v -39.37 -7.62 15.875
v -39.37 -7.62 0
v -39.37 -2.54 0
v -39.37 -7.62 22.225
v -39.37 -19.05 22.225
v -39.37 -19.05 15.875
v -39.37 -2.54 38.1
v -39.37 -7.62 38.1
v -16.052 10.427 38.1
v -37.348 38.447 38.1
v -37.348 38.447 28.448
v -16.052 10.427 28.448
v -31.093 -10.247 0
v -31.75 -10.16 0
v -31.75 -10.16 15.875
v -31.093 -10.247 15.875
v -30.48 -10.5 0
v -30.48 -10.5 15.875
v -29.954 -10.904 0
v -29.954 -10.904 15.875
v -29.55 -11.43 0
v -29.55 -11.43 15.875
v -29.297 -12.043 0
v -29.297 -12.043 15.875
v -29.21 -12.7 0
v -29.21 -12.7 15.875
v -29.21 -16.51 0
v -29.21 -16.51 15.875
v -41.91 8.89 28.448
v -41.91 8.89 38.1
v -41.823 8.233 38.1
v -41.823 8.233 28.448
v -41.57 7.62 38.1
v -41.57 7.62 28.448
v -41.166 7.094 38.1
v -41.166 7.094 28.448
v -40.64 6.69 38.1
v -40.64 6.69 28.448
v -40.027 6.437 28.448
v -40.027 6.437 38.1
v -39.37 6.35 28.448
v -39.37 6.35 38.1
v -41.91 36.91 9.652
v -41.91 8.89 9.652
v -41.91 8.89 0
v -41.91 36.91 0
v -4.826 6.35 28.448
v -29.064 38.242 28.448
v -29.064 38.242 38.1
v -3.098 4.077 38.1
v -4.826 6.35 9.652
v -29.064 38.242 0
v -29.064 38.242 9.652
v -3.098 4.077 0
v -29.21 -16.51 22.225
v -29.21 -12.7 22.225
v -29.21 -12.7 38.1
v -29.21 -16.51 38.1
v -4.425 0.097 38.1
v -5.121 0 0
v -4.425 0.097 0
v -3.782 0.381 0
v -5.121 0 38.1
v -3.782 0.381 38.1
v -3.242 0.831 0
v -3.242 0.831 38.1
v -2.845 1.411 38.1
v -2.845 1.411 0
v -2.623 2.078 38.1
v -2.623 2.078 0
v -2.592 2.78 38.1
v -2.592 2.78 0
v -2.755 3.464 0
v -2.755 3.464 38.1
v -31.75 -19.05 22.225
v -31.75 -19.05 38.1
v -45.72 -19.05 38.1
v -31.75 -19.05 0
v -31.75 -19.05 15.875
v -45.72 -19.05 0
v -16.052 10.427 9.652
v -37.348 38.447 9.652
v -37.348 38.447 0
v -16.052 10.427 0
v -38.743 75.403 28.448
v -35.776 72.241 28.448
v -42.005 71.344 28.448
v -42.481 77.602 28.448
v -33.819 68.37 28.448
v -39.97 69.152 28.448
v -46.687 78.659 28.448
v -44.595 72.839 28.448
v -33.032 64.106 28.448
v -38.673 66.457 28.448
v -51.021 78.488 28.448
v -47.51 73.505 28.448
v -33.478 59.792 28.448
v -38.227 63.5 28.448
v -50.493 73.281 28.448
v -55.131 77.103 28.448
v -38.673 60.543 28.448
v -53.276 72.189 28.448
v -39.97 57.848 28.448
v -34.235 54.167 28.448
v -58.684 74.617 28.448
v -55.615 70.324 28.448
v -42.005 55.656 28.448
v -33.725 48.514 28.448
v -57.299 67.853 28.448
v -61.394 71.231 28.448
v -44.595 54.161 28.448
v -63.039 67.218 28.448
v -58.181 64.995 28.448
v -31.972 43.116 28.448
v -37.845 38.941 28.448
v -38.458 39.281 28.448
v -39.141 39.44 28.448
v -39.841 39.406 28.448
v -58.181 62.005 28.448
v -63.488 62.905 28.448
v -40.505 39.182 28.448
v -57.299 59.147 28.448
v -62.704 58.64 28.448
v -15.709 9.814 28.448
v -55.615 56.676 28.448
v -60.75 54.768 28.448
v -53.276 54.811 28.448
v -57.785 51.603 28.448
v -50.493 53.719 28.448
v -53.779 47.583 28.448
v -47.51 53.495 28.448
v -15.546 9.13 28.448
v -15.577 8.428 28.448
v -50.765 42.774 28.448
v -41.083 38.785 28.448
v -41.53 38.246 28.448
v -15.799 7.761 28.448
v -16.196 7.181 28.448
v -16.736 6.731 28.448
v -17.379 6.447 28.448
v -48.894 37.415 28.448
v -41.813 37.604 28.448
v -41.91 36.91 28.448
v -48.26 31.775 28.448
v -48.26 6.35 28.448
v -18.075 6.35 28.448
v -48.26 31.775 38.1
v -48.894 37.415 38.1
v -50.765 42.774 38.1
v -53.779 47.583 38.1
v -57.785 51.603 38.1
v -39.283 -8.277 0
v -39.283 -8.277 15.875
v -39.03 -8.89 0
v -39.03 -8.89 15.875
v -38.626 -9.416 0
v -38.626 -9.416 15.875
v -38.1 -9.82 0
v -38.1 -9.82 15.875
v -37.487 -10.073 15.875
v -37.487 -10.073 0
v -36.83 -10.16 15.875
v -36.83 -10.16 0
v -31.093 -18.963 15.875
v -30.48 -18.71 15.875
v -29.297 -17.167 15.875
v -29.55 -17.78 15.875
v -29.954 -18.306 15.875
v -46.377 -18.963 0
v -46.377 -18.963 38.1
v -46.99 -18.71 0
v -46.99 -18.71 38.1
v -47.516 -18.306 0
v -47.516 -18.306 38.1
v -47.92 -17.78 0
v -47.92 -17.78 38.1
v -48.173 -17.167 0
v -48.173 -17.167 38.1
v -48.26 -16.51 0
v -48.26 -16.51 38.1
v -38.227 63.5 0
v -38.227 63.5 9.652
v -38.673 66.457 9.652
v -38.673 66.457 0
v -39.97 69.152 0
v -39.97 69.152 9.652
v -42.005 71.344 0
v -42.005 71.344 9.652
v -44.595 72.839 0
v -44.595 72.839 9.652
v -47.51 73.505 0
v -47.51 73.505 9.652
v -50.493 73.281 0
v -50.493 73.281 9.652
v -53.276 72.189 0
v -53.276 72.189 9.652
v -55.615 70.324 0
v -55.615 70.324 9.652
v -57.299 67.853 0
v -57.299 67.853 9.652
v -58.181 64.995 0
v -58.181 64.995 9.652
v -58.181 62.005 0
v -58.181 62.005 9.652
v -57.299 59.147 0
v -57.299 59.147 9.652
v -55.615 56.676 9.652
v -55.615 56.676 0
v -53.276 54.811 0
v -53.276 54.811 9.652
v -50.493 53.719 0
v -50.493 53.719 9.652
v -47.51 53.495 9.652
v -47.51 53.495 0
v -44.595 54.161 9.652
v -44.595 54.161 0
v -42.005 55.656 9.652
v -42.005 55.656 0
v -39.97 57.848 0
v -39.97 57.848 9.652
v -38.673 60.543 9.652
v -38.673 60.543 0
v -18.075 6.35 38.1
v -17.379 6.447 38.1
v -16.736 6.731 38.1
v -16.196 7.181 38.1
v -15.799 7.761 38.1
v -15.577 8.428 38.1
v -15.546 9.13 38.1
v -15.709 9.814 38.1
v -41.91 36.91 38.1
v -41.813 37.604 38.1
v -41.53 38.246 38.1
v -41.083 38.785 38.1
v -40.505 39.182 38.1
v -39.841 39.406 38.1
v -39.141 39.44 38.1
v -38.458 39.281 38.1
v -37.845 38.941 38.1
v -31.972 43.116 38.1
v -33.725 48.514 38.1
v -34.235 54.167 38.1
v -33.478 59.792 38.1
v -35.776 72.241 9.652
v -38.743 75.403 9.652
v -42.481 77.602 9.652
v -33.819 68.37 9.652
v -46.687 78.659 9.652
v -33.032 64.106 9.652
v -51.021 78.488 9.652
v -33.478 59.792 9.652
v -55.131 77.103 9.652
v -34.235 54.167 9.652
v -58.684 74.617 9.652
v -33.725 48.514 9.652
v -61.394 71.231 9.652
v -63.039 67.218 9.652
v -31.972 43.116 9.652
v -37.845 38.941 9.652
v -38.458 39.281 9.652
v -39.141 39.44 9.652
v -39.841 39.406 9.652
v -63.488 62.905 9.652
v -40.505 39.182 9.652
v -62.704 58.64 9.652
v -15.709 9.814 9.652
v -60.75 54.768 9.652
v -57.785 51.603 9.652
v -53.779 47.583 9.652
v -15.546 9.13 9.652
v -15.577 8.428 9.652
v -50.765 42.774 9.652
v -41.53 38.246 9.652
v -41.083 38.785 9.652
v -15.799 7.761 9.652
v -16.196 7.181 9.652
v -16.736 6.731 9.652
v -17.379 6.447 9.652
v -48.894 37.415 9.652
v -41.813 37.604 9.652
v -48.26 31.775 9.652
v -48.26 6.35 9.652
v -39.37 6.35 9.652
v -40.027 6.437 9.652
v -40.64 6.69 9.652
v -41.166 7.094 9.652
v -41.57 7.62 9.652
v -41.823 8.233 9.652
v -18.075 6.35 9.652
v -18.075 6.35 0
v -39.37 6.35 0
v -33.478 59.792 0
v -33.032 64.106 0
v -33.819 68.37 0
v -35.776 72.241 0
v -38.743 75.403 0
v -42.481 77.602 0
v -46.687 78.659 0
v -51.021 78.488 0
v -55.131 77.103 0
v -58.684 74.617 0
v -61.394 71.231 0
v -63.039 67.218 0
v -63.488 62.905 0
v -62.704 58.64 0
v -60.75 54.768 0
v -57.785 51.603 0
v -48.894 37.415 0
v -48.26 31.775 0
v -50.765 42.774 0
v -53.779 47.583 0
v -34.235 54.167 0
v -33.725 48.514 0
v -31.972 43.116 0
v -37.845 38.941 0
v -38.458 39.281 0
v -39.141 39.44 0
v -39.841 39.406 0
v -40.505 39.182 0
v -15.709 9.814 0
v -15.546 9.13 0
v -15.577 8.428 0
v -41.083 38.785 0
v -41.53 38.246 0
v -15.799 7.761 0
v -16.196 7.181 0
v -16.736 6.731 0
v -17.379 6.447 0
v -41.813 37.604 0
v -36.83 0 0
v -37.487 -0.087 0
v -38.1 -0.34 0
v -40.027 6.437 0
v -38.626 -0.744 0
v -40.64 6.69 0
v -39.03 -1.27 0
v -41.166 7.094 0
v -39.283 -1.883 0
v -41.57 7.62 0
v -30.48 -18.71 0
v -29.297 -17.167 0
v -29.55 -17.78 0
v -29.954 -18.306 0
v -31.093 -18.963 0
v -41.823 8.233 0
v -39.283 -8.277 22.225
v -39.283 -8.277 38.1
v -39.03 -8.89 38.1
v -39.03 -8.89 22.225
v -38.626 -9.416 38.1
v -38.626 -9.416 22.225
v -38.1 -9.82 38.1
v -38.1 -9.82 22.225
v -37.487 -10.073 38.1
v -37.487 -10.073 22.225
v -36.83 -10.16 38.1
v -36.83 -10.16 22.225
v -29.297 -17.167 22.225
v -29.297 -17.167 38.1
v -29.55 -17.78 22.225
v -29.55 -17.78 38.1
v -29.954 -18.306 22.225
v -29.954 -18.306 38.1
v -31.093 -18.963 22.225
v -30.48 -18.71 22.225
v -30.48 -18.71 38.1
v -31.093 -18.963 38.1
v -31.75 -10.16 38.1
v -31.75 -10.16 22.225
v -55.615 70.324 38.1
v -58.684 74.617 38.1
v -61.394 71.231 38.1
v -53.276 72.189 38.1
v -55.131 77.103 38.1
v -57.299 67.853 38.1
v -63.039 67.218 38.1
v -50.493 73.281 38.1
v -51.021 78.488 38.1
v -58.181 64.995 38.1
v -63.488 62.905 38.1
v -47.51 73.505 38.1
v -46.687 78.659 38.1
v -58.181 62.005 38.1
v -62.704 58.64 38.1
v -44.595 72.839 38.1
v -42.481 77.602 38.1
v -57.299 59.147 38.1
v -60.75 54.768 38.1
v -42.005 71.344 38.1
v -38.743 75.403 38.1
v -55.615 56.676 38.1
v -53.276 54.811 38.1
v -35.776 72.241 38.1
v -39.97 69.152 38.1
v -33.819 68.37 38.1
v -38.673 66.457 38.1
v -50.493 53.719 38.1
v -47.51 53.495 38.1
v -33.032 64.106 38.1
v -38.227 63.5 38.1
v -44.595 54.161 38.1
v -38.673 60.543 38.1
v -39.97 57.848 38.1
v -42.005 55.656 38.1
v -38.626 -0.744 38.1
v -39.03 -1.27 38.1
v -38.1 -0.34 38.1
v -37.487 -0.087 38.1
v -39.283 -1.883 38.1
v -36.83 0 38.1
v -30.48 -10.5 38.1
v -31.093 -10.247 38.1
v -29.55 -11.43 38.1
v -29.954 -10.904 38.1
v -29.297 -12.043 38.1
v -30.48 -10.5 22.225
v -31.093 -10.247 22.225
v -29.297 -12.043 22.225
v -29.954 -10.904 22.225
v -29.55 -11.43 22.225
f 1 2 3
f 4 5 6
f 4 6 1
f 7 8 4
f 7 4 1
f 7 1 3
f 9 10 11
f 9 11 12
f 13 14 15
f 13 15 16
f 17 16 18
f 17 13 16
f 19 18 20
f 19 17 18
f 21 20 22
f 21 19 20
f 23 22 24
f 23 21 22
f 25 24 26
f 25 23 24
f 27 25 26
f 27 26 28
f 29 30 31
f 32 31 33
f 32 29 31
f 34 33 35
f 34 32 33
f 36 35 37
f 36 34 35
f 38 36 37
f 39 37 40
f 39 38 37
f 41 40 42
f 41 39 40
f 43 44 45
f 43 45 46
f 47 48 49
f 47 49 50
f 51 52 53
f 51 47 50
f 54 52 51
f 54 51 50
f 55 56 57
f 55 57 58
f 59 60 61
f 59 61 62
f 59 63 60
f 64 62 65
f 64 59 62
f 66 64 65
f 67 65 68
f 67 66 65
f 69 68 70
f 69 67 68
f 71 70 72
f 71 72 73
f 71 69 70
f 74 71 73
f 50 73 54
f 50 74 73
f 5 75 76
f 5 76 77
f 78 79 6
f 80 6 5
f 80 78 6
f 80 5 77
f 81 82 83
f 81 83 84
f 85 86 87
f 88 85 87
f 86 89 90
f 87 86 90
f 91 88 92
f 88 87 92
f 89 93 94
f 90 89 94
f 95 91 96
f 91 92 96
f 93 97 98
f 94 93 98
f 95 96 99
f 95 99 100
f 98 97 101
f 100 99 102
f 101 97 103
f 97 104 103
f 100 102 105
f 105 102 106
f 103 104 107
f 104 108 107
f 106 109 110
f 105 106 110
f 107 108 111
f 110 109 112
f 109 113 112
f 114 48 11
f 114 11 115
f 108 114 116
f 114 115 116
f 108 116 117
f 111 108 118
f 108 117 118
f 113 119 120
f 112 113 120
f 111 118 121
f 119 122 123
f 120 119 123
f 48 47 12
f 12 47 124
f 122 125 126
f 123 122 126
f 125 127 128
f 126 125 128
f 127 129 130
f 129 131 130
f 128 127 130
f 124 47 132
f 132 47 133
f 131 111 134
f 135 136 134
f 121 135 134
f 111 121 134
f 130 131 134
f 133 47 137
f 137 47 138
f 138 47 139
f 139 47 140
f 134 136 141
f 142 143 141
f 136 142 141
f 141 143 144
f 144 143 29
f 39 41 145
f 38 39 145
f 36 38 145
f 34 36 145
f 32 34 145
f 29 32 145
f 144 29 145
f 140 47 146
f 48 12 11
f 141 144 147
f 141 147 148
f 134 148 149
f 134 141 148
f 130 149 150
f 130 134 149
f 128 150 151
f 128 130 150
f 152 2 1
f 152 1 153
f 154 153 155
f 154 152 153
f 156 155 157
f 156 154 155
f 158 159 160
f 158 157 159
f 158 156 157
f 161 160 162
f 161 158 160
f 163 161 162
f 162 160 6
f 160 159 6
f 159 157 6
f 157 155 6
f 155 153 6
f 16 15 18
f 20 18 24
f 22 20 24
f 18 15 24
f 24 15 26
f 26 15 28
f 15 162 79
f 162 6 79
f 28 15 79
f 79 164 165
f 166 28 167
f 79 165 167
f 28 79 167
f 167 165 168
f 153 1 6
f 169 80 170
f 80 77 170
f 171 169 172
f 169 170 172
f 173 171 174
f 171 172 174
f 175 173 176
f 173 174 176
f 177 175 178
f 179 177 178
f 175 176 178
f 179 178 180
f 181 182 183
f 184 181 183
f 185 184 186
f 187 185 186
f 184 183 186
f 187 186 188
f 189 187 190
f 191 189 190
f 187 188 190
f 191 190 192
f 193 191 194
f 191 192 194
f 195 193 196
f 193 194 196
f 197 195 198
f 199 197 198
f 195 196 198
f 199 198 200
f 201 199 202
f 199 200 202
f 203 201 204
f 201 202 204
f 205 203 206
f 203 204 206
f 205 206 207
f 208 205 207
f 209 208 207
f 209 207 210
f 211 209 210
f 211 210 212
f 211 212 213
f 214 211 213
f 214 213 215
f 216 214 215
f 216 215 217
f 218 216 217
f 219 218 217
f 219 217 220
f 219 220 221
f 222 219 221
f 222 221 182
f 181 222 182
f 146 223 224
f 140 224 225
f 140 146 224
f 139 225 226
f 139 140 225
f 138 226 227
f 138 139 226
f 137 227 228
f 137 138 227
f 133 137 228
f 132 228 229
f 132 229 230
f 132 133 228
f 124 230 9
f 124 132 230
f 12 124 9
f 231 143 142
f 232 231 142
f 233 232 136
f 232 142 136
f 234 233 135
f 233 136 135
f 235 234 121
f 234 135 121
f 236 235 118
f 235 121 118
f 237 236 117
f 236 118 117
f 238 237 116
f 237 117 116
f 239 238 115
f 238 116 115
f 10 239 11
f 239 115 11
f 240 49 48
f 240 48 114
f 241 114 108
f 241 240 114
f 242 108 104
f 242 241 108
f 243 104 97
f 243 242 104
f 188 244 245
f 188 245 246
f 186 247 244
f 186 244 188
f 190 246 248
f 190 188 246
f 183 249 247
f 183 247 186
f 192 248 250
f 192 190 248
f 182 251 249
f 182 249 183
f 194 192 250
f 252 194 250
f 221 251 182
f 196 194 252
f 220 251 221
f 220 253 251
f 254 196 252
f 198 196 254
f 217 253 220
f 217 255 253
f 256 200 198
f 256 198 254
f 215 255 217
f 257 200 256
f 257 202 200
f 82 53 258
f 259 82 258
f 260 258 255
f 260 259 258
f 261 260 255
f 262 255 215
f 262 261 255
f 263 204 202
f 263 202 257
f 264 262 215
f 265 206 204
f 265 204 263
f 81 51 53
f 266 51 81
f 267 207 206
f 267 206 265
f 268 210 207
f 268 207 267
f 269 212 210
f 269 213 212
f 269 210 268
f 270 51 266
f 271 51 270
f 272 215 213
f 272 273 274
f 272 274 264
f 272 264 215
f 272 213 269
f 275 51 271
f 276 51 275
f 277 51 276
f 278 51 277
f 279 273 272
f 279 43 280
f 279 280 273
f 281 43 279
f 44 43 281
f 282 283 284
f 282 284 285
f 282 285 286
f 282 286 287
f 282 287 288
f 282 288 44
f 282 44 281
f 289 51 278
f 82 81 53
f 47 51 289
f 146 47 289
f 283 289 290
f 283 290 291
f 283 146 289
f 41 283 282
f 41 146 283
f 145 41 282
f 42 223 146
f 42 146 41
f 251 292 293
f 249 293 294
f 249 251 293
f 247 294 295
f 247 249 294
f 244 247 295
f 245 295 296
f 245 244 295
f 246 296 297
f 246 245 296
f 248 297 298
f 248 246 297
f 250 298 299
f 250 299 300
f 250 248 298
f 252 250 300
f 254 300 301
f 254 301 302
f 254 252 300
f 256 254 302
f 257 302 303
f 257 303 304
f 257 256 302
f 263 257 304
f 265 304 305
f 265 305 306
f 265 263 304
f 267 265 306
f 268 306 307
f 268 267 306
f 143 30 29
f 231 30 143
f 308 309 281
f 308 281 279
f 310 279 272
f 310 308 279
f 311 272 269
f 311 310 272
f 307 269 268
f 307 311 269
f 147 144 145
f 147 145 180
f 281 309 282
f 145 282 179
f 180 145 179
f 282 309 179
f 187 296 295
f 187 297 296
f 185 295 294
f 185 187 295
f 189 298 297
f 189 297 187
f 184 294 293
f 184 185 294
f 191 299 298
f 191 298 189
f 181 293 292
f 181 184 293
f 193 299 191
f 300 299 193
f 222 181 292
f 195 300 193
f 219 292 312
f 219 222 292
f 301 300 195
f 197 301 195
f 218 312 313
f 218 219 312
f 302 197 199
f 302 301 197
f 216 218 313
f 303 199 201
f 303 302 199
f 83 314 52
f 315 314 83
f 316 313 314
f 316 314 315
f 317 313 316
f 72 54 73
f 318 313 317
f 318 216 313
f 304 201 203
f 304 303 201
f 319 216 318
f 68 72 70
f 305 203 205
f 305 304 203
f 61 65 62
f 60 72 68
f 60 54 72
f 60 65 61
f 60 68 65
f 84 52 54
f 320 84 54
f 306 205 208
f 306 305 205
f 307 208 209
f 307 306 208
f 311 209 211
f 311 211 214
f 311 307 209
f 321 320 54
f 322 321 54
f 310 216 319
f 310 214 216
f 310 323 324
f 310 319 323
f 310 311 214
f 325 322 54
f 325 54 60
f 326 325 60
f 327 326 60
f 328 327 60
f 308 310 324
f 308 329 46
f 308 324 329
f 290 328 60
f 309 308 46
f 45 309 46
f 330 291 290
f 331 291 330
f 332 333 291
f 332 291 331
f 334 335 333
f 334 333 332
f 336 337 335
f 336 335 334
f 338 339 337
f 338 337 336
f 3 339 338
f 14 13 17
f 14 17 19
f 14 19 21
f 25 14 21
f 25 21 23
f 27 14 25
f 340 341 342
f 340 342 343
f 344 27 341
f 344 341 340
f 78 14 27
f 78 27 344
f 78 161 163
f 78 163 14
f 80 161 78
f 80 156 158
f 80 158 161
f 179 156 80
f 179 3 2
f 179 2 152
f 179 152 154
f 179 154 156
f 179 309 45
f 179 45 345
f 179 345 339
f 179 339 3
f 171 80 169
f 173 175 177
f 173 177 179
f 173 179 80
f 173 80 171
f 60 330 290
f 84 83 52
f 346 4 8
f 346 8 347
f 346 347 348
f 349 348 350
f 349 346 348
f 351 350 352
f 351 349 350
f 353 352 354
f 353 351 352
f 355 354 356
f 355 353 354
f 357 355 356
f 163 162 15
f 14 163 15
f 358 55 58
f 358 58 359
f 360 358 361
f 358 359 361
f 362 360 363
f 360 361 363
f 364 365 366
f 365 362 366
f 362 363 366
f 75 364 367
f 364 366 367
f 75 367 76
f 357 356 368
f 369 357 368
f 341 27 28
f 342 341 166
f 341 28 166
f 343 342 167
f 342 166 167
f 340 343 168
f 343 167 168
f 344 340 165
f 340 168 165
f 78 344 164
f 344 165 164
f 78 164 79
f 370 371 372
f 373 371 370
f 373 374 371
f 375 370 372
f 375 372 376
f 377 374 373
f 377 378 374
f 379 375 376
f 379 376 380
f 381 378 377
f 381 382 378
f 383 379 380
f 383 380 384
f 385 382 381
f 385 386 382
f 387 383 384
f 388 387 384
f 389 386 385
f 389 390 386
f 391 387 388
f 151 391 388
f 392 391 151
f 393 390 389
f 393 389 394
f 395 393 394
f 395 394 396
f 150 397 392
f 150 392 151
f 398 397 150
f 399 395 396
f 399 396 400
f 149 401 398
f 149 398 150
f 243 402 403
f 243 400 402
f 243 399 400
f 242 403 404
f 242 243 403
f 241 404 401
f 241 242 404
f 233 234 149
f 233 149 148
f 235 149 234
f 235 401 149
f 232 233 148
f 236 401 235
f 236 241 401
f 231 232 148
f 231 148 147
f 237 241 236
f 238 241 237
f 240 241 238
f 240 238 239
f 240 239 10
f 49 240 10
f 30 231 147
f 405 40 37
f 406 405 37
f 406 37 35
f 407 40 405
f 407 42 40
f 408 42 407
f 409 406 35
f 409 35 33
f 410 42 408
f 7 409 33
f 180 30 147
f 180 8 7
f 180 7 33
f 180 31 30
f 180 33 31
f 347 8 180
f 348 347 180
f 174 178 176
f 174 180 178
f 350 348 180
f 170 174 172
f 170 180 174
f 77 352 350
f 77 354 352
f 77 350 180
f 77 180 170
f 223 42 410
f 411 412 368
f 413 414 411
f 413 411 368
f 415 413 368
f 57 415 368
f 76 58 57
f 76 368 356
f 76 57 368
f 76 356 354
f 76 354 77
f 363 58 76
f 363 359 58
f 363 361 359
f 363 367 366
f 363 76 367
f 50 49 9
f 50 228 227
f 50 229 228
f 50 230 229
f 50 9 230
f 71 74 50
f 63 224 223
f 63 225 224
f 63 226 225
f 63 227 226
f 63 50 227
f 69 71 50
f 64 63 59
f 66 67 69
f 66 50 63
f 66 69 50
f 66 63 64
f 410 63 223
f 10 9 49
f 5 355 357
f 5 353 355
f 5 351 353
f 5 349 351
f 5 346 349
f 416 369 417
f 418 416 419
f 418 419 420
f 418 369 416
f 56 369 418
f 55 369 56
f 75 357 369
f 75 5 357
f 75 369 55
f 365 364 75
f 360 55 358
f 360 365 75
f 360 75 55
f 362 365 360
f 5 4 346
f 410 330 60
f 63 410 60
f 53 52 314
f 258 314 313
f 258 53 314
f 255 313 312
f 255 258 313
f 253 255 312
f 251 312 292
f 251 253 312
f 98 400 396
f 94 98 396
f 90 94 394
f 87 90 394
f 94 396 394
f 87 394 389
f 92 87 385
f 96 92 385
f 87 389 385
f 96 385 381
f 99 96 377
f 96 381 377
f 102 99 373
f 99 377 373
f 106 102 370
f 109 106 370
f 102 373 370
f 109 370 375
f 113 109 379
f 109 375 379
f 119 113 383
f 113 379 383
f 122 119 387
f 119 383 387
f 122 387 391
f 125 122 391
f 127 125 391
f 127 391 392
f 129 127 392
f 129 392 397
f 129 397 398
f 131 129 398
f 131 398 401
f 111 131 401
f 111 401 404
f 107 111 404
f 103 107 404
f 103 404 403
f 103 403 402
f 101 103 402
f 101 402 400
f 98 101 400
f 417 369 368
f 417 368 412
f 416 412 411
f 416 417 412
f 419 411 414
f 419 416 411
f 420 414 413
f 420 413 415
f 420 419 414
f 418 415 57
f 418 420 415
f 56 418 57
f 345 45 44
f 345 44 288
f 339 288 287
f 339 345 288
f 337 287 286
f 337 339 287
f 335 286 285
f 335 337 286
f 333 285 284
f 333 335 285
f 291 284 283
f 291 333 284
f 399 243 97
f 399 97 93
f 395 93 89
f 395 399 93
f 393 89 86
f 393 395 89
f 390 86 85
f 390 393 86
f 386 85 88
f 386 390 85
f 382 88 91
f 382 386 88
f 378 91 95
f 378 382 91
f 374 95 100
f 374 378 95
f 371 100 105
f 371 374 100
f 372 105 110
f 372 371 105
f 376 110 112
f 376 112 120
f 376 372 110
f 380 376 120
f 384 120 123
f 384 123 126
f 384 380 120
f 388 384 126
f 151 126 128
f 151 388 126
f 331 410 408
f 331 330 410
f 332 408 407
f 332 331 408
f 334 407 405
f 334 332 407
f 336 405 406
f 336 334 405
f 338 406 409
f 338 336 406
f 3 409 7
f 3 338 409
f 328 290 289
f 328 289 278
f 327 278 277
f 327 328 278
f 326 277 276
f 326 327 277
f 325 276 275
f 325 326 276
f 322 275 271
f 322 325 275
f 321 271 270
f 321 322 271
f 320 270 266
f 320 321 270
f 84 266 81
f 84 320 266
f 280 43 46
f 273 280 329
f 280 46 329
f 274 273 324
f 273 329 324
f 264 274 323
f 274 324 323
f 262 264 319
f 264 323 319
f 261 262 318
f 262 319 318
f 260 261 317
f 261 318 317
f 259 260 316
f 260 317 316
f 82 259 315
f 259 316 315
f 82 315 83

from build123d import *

# Parameters (mm, degrees)
BOSS_EXTRUDE1_DEPTH = 38.1
SKETCH2_R           = 15.24
BOSS_EXTRUDE2_DEPTH = 38.1
SKETCH3_R           = 10.033
SKETCH3_W           = 10.16
SKETCH3_H           = 10.16
CUT_EXTRUDE1_DEPTH  = 109.091847981
FILLET9_R           = 25.4
FILLET14_R          = 2.54
FILLET15_R          = 2.54
FILLET16_R          = 2.54
FILLET17_R          = 2.54
CUT_EXTRUDE2_REACH  = 124.665
SKETCH4_W           = 10.16
SKETCH4_H           = 6.35
SKETCH6_W           = 76.2
SKETCH6_H           = 18.796
CUT_EXTRUDE3_DEPTH  = 104.55757867


with BuildPart() as part:
    # Sketch1 → Boss-Extrude1 (new body)
    with BuildSketch(Plane(origin=(0, 0, 0), x_dir=(0, 1, 0), z_dir=(0, 0, 1))):
        Polygon((0, 48.26), (63.5, 48.26), (0, 0), (0, 29.21), (-19.05, 29.21), (-19.05, 48.26), align=None)
    extrude(amount=BOSS_EXTRUDE1_DEPTH)

    # Sketch2 → Boss-Extrude2 (add)
    with BuildSketch(Plane(origin=(0, 0, 38.1), x_dir=(0, -1, 0), z_dir=(0, 0, 1))):
        with Locations((-63.5, -48.26)):
            Circle(SKETCH2_R)
    extrude(amount=-BOSS_EXTRUDE2_DEPTH)

    # Sketch3 → Cut-Extrude1 (cut, through all)
    with BuildSketch(Plane.XY.offset(38.1)):
        with Locations((-48.26, 63.5)):
            Circle(SKETCH3_R)
        with Locations((-34.29, -5.08)):
            Rectangle(SKETCH3_W, SKETCH3_H)
        Polygon((-12.954, 6.35), (-41.91, 6.35), (-41.91, 44.45), align=None)
    extrude(amount=-CUT_EXTRUDE1_DEPTH, mode=Mode.SUBTRACT)

    # Fillet9
    fillet9_edges = [part.edges().sort_by_distance(p)[0] for p in [
        (-39.038531003, 51.366488162, 19.05),
        (-48.26, 48.26, 19.05),
    ]]
    fillet(fillet9_edges, radius=FILLET9_R)

    # Fillet14
    fillet14_edges = [part.edges().sort_by_distance(p)[0] for p in [
        (-41.91, 44.45, 19.05),
        (-12.954, 6.35, 19.05),
        (-41.91, 6.35, 19.05),
    ]]
    fillet(fillet14_edges, radius=FILLET14_R)

    # Fillet15
    fillet15_edges = [part.edges().sort_by_distance(p)[0] for p in [
        (-39.37, -10.16, 19.05),
        (-39.37, 0, 19.05),
    ]]
    fillet(fillet15_edges, radius=FILLET15_R)

    # Fillet16
    fillet16_edges = [part.edges().sort_by_distance(p)[0] for p in [
        (-29.21, -10.16, 19.05),
    ]]
    fillet(fillet16_edges, radius=FILLET16_R)

    # Fillet17
    fillet17_edges = [part.edges().sort_by_distance(p)[0] for p in [
        (-29.21, -19.05, 19.05),
        (-48.26, -19.05, 19.05),
        (0, 0, 19.05),
    ]]
    fillet(fillet17_edges, radius=FILLET17_R)

    # Sketch4 → Cut-Extrude2 (cut, up to next)
    with BuildSketch(Plane.XZ.offset(19.05), mode=Mode.PRIVATE) as cut_extrude2_sk1:
        with Locations((-34.29, 19.05)):
            Rectangle(SKETCH4_W, SKETCH4_H)
    cut_extrude2_tool1 = extrude(cut_extrude2_sk1.sketch, amount=-CUT_EXTRUDE2_REACH, mode=Mode.PRIVATE) & part.part
    add(cut_extrude2_tool1.solids().sort_by_distance((-34.29, -19.05, 19.05))[0], mode=Mode.SUBTRACT)

    # Sketch6 → Cut-Extrude3 (cut, through all)
    with BuildSketch(Plane(origin=(0, 6.35, 0), x_dir=(-1, 0, 0), z_dir=(0, 1, 0))):
        with Locations((27.795452673, 19.05)):
            Rectangle(SKETCH6_W, SKETCH6_H)
    extrude(amount=CUT_EXTRUDE3_DEPTH, mode=Mode.SUBTRACT)


solid = part.part
